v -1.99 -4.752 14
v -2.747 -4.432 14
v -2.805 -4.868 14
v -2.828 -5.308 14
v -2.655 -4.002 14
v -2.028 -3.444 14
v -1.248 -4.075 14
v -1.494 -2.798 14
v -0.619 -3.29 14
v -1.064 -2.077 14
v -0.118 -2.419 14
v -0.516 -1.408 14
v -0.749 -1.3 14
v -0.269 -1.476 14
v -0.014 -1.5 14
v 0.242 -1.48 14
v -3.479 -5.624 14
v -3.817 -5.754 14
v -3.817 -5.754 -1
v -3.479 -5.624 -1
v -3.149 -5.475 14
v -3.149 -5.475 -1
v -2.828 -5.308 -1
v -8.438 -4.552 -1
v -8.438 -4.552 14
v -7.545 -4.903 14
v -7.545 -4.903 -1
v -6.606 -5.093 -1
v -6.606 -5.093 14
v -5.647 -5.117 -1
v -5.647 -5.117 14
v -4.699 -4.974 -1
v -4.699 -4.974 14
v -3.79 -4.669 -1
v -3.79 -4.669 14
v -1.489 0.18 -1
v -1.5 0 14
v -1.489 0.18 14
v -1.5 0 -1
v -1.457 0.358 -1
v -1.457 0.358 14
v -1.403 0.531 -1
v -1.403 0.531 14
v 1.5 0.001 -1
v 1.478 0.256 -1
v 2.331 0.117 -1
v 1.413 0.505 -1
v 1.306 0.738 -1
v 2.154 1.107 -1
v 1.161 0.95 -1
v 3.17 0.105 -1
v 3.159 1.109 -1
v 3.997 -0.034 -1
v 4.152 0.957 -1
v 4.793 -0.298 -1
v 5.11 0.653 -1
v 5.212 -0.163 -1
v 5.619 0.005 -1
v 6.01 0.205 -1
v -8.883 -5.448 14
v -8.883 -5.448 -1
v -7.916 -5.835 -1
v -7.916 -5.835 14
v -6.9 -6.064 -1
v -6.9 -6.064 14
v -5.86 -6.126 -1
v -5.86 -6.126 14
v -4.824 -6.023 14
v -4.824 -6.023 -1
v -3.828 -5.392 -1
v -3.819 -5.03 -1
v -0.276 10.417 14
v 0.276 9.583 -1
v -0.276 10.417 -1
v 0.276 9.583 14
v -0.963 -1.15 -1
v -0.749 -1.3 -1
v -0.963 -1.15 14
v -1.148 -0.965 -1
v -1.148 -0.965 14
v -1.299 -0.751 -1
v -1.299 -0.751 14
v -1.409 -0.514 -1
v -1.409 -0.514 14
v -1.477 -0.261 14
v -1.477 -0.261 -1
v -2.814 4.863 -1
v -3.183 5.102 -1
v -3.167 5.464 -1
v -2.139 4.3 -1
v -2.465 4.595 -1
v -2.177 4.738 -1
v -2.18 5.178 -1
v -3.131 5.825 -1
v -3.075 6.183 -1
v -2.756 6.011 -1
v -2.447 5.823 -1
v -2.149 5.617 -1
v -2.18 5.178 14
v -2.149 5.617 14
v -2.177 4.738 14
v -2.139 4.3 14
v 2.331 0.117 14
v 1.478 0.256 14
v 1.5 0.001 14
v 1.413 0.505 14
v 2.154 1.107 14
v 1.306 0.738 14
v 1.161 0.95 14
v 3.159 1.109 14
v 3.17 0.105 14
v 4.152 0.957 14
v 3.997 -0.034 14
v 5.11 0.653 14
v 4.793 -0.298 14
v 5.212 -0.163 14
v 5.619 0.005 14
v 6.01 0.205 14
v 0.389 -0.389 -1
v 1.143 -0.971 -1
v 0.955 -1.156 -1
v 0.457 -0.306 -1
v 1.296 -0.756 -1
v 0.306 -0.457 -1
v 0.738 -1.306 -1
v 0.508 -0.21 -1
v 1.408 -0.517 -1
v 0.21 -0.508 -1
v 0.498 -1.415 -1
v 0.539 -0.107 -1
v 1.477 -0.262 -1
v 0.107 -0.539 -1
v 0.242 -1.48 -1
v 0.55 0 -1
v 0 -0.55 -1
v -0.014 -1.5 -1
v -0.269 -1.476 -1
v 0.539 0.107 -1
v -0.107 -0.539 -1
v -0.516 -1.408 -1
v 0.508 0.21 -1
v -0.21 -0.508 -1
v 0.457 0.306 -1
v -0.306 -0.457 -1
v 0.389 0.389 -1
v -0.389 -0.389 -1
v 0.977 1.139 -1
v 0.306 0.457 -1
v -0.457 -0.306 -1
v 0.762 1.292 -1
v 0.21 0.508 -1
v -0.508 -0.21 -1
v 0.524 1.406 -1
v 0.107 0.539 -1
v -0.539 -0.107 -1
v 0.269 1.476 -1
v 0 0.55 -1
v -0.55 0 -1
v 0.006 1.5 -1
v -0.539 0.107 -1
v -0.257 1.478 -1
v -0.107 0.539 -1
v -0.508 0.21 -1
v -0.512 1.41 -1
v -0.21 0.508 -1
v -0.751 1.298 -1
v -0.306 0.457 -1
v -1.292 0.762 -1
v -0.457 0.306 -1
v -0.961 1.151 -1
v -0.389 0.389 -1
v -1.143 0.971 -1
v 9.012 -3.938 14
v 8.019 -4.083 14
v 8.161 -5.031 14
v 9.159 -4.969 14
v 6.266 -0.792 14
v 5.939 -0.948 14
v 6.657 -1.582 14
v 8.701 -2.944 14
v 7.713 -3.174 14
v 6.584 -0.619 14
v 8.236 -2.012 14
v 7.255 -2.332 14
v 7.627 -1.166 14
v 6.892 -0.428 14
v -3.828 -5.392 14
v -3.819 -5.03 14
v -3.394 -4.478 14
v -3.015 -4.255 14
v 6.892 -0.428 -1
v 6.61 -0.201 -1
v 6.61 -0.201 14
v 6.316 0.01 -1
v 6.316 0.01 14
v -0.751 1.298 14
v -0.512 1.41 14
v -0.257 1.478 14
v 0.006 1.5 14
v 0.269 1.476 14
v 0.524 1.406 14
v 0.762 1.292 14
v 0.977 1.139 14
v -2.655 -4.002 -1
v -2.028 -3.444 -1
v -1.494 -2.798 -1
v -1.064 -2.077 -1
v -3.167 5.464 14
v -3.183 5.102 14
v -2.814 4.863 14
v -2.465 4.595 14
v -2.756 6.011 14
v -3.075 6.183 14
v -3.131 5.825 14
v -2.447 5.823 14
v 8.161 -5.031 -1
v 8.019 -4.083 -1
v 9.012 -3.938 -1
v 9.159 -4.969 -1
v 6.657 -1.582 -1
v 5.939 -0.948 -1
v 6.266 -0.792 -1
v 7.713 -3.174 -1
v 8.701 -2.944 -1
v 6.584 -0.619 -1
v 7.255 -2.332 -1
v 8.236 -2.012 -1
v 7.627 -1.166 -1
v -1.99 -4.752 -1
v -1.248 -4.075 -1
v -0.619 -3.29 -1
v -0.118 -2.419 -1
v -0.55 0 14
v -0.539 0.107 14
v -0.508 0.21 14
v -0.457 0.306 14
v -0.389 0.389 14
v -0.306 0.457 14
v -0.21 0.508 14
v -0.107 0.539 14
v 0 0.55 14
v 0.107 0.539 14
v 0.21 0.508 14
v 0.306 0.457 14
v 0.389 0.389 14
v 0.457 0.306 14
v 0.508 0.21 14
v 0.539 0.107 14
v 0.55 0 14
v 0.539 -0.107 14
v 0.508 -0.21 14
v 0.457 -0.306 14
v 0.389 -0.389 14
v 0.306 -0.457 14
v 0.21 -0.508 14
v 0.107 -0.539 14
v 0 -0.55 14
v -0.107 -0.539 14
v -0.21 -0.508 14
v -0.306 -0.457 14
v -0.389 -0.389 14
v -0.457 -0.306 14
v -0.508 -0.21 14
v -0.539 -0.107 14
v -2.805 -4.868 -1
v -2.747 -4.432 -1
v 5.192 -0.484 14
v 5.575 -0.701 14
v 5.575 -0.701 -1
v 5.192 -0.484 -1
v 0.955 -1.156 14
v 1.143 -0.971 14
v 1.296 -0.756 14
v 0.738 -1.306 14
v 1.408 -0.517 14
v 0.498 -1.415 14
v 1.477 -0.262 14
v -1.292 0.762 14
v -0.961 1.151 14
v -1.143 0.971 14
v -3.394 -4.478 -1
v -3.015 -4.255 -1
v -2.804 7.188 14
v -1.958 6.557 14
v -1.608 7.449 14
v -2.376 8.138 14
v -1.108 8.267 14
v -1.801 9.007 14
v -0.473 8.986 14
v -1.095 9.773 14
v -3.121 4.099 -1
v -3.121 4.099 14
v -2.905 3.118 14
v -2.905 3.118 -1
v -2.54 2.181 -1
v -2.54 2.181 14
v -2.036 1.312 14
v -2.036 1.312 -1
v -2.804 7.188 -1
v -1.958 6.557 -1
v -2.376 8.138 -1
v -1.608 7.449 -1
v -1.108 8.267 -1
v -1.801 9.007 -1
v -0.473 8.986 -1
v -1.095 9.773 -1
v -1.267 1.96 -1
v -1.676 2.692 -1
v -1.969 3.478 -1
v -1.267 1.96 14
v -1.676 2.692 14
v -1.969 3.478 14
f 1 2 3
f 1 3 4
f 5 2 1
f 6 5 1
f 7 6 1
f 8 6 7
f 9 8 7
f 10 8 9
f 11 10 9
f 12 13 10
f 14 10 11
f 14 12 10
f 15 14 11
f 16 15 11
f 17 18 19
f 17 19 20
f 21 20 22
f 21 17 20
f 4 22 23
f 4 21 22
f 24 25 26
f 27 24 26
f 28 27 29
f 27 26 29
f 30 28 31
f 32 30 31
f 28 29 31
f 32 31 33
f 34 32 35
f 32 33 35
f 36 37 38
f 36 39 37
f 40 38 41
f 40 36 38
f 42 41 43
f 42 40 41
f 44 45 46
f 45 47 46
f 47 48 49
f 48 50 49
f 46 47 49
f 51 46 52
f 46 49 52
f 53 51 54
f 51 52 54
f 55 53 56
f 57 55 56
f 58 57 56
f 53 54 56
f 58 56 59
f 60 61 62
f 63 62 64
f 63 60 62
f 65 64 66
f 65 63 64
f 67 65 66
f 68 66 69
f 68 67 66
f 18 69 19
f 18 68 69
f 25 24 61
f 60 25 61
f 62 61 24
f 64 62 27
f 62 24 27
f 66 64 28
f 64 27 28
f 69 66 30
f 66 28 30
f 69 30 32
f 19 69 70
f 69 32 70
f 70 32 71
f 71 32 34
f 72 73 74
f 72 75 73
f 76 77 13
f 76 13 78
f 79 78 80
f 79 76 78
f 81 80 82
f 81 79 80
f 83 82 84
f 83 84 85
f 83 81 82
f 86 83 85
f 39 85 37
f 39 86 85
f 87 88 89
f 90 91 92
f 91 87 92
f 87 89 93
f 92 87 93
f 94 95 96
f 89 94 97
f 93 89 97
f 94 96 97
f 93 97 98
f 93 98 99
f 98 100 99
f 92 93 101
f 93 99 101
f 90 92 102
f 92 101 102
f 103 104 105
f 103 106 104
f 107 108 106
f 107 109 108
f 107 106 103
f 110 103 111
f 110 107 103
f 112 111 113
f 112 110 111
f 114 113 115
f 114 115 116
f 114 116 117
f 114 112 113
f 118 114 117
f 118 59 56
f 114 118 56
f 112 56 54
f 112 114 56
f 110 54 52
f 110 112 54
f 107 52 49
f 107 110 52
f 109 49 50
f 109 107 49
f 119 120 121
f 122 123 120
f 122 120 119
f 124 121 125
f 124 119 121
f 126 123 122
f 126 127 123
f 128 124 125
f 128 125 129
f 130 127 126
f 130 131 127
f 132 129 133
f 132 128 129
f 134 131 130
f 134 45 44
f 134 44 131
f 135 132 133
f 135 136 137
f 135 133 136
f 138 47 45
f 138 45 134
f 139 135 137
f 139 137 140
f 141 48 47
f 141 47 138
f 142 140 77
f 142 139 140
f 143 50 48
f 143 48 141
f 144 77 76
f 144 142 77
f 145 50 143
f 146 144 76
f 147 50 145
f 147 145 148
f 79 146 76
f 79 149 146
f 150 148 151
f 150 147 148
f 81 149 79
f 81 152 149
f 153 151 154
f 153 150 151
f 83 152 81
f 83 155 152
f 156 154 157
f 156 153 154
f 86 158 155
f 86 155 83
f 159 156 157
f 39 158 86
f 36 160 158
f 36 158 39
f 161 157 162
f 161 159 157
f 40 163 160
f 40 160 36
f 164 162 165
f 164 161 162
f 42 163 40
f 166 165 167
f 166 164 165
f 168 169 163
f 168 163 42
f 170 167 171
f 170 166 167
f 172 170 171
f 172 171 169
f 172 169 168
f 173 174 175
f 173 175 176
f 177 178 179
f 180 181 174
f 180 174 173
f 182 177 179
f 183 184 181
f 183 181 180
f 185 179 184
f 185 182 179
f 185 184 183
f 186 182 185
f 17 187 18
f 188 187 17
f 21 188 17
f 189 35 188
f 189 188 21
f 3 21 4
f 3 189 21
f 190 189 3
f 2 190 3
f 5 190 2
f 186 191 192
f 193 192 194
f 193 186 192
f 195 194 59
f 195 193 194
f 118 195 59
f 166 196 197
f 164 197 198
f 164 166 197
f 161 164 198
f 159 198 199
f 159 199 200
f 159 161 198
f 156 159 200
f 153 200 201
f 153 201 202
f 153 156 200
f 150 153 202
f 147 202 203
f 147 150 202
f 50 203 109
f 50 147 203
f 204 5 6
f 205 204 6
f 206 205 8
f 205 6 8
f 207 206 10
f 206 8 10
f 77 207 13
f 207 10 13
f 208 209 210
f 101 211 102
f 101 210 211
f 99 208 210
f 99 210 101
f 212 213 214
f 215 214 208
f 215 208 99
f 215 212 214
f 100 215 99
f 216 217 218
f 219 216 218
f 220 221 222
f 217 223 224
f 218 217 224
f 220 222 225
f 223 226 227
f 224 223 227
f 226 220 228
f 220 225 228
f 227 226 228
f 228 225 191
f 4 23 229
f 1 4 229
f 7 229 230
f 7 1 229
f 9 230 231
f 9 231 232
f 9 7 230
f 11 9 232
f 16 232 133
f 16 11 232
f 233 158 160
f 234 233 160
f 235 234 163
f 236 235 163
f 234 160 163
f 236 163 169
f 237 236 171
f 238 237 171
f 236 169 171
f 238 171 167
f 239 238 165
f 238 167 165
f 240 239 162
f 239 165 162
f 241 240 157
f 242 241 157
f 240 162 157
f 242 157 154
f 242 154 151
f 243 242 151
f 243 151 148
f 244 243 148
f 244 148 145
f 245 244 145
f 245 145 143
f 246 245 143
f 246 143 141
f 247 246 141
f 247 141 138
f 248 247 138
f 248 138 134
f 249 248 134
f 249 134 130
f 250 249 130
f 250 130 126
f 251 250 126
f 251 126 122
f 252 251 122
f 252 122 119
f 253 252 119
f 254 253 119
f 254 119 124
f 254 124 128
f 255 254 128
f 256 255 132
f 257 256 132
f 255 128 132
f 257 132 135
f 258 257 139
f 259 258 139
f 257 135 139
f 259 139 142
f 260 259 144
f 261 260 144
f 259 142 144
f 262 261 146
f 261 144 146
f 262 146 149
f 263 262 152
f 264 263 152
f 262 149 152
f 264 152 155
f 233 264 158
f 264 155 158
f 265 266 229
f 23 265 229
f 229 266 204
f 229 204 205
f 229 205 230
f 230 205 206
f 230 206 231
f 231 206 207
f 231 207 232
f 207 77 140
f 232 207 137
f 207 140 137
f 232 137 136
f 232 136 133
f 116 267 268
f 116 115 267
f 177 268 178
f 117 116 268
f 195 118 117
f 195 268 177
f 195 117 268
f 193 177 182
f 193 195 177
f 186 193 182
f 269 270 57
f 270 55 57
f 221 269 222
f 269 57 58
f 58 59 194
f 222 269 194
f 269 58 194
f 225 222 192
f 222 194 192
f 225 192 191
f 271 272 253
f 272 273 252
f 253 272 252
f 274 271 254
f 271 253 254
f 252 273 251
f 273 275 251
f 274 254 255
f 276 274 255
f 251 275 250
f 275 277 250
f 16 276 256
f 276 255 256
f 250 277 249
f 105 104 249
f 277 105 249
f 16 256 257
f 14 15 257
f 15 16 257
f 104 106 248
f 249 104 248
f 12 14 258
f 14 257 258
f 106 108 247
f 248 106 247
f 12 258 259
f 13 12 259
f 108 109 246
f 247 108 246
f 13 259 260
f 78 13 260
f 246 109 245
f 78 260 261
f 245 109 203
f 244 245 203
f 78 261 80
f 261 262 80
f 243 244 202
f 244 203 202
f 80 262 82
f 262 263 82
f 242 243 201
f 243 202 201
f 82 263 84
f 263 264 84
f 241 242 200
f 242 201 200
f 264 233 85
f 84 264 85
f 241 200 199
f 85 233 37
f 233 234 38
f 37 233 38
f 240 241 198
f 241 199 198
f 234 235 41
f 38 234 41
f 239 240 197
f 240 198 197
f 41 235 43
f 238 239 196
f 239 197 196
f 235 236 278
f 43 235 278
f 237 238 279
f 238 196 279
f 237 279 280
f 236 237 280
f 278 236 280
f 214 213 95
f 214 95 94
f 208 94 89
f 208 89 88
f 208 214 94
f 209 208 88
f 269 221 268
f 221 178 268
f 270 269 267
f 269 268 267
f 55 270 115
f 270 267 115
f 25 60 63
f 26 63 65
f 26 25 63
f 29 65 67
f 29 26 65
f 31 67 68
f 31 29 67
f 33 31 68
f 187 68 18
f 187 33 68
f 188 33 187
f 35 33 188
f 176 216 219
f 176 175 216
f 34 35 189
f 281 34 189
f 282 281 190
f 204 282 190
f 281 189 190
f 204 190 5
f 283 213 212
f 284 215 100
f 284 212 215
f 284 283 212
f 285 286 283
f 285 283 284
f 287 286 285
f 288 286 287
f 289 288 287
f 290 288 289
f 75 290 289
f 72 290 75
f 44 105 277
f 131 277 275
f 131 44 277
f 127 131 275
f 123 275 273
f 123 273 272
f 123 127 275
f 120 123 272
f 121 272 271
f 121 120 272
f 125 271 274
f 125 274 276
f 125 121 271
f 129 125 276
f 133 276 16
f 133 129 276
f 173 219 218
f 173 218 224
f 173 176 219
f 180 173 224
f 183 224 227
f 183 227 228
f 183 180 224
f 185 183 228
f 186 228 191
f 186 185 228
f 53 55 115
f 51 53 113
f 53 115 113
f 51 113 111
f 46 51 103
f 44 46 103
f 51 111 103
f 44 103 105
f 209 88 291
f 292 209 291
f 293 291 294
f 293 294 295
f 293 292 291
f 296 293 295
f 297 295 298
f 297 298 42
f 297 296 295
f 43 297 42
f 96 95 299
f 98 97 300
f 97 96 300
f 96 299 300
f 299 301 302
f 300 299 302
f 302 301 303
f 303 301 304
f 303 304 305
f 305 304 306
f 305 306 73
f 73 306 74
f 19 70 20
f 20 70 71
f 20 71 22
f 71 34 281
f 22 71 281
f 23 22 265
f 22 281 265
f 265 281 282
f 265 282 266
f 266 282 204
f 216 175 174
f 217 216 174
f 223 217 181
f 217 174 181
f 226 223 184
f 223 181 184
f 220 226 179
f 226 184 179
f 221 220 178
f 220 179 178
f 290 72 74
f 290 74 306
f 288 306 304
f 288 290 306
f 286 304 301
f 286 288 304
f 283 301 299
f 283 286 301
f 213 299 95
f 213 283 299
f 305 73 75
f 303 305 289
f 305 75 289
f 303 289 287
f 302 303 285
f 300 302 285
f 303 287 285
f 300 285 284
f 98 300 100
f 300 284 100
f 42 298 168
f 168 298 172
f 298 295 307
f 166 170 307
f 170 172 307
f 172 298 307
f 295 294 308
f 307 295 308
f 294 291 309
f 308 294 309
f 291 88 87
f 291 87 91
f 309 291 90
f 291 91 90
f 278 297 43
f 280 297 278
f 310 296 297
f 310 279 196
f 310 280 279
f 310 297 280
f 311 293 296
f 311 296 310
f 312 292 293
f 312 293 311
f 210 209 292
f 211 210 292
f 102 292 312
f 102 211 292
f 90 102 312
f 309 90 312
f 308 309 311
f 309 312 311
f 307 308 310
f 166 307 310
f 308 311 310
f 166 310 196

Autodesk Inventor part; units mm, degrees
ref_plane "YZ Plane" through (0, 0, 0) normal (1, 0, 0) x (0, 1, 0)
ref_plane "XZ Plane" through (0, 0, 0) normal (0, 1, 0) x (-1, 0, 0)
ref_plane "XY Plane" through (0, 0, 0) normal (0, 0, 1) x (1, 0, 0)
ref_plane "Work Plane1" through (8.8633, 1.5628, -1) normal (0, 0, -1) x (-1, 0, 0)
sketch "Sketch1" plane through (8.8633, 1.5628, -1) normal (0, 0, -1) x (-1, 0, 0)
  circle A0 centre (8.8633, -1.5628) radius 1.5 projected
  circle A1 centre (8.8633, -1.5628) radius 0.55 projected
  point P0 (8.8633, -1.5628)
extrude "Extrusion1" add sketch "Sketch1" against normal blind 15
sketch "Sketch2" plane through (0, 0, 14) normal (0, 0, 1) x (1, 0, 0)
  circle A0 centre (0, 0) radius 1.5 projected
  line L0 (0.2764, 9.5833) -> (-0.2764, 10.4166)
  line L1 (8.1612, -5.0311) -> (9.1593, -4.969) projected
  line L2 (-8.4376, -4.5523) -> (-8.8829, -5.4477) projected
  arc A1 (8.1612, -5.0311) -> (1.5, 0.0014) centre (2.6718, -5.3723) ccw
  arc A2 (-8.4376, -4.5523) -> (-0.7487, -1.2998) centre (-5.9884, 0.3723) ccw
  arc A3 (-8.8829, -5.4477) -> (0.242, -1.4803) centre (-5.9884, 0.3723) ccw
  line L3 (-8.8829, -5.4477) -> (-8.4376, -4.5523)
  line L4 (8.1612, -5.0311) -> (9.1593, -4.969)
  circle A4 centre (3.3166, 4.9999) radius 5.4999 projected
  circle A5 centre (3.3165, 4.9999) radius 6.4999 projected
  circle A6 centre (2.6718, -5.3723) radius 5.5 projected
  circle A7 centre (2.6718, -5.3725) radius 6.5001 projected
  circle A8 centre (-5.9884, 0.3723) radius 6.5 projected
  circle A9 centre (-5.9884, 0.3721) radius 5.4999 projected
  arc A10 (-0.2764, 10.4166) -> (-1.403, 0.5306) centre (3.3167, 5) ccw
  arc A11 (0.2764, 9.5833) -> (-0.7512, 1.2983) centre (3.3167, 5) ccw
  arc A12 (9.1593, -4.969) -> (1.161, 0.9497) centre (2.6718, -5.3723) ccw
  point P0 (0, 0)
  point P1 (-2.459, 2.3282)
extrude "Extrusion2" add sketch "Sketch2" against normal blind 15 contours A0 A7 A4 A1 | A4 A7 A5 A1 | A5 A7 L1 A1 | A8 A5 L0 A4 | A4 A9 A5 A8 | A3 A6 A2 A0 | A0 A5 A9 A4 | A3 A7 A2 A6 | L2 A2 A7 A3
sketch "Sketch4" plane through (8.8633, 1.5628, 14) normal (0, 0, 1) x (1, 0, 0)
  point P0 (-8.8633, -1.5628)
properties part number "pump_impeller"
